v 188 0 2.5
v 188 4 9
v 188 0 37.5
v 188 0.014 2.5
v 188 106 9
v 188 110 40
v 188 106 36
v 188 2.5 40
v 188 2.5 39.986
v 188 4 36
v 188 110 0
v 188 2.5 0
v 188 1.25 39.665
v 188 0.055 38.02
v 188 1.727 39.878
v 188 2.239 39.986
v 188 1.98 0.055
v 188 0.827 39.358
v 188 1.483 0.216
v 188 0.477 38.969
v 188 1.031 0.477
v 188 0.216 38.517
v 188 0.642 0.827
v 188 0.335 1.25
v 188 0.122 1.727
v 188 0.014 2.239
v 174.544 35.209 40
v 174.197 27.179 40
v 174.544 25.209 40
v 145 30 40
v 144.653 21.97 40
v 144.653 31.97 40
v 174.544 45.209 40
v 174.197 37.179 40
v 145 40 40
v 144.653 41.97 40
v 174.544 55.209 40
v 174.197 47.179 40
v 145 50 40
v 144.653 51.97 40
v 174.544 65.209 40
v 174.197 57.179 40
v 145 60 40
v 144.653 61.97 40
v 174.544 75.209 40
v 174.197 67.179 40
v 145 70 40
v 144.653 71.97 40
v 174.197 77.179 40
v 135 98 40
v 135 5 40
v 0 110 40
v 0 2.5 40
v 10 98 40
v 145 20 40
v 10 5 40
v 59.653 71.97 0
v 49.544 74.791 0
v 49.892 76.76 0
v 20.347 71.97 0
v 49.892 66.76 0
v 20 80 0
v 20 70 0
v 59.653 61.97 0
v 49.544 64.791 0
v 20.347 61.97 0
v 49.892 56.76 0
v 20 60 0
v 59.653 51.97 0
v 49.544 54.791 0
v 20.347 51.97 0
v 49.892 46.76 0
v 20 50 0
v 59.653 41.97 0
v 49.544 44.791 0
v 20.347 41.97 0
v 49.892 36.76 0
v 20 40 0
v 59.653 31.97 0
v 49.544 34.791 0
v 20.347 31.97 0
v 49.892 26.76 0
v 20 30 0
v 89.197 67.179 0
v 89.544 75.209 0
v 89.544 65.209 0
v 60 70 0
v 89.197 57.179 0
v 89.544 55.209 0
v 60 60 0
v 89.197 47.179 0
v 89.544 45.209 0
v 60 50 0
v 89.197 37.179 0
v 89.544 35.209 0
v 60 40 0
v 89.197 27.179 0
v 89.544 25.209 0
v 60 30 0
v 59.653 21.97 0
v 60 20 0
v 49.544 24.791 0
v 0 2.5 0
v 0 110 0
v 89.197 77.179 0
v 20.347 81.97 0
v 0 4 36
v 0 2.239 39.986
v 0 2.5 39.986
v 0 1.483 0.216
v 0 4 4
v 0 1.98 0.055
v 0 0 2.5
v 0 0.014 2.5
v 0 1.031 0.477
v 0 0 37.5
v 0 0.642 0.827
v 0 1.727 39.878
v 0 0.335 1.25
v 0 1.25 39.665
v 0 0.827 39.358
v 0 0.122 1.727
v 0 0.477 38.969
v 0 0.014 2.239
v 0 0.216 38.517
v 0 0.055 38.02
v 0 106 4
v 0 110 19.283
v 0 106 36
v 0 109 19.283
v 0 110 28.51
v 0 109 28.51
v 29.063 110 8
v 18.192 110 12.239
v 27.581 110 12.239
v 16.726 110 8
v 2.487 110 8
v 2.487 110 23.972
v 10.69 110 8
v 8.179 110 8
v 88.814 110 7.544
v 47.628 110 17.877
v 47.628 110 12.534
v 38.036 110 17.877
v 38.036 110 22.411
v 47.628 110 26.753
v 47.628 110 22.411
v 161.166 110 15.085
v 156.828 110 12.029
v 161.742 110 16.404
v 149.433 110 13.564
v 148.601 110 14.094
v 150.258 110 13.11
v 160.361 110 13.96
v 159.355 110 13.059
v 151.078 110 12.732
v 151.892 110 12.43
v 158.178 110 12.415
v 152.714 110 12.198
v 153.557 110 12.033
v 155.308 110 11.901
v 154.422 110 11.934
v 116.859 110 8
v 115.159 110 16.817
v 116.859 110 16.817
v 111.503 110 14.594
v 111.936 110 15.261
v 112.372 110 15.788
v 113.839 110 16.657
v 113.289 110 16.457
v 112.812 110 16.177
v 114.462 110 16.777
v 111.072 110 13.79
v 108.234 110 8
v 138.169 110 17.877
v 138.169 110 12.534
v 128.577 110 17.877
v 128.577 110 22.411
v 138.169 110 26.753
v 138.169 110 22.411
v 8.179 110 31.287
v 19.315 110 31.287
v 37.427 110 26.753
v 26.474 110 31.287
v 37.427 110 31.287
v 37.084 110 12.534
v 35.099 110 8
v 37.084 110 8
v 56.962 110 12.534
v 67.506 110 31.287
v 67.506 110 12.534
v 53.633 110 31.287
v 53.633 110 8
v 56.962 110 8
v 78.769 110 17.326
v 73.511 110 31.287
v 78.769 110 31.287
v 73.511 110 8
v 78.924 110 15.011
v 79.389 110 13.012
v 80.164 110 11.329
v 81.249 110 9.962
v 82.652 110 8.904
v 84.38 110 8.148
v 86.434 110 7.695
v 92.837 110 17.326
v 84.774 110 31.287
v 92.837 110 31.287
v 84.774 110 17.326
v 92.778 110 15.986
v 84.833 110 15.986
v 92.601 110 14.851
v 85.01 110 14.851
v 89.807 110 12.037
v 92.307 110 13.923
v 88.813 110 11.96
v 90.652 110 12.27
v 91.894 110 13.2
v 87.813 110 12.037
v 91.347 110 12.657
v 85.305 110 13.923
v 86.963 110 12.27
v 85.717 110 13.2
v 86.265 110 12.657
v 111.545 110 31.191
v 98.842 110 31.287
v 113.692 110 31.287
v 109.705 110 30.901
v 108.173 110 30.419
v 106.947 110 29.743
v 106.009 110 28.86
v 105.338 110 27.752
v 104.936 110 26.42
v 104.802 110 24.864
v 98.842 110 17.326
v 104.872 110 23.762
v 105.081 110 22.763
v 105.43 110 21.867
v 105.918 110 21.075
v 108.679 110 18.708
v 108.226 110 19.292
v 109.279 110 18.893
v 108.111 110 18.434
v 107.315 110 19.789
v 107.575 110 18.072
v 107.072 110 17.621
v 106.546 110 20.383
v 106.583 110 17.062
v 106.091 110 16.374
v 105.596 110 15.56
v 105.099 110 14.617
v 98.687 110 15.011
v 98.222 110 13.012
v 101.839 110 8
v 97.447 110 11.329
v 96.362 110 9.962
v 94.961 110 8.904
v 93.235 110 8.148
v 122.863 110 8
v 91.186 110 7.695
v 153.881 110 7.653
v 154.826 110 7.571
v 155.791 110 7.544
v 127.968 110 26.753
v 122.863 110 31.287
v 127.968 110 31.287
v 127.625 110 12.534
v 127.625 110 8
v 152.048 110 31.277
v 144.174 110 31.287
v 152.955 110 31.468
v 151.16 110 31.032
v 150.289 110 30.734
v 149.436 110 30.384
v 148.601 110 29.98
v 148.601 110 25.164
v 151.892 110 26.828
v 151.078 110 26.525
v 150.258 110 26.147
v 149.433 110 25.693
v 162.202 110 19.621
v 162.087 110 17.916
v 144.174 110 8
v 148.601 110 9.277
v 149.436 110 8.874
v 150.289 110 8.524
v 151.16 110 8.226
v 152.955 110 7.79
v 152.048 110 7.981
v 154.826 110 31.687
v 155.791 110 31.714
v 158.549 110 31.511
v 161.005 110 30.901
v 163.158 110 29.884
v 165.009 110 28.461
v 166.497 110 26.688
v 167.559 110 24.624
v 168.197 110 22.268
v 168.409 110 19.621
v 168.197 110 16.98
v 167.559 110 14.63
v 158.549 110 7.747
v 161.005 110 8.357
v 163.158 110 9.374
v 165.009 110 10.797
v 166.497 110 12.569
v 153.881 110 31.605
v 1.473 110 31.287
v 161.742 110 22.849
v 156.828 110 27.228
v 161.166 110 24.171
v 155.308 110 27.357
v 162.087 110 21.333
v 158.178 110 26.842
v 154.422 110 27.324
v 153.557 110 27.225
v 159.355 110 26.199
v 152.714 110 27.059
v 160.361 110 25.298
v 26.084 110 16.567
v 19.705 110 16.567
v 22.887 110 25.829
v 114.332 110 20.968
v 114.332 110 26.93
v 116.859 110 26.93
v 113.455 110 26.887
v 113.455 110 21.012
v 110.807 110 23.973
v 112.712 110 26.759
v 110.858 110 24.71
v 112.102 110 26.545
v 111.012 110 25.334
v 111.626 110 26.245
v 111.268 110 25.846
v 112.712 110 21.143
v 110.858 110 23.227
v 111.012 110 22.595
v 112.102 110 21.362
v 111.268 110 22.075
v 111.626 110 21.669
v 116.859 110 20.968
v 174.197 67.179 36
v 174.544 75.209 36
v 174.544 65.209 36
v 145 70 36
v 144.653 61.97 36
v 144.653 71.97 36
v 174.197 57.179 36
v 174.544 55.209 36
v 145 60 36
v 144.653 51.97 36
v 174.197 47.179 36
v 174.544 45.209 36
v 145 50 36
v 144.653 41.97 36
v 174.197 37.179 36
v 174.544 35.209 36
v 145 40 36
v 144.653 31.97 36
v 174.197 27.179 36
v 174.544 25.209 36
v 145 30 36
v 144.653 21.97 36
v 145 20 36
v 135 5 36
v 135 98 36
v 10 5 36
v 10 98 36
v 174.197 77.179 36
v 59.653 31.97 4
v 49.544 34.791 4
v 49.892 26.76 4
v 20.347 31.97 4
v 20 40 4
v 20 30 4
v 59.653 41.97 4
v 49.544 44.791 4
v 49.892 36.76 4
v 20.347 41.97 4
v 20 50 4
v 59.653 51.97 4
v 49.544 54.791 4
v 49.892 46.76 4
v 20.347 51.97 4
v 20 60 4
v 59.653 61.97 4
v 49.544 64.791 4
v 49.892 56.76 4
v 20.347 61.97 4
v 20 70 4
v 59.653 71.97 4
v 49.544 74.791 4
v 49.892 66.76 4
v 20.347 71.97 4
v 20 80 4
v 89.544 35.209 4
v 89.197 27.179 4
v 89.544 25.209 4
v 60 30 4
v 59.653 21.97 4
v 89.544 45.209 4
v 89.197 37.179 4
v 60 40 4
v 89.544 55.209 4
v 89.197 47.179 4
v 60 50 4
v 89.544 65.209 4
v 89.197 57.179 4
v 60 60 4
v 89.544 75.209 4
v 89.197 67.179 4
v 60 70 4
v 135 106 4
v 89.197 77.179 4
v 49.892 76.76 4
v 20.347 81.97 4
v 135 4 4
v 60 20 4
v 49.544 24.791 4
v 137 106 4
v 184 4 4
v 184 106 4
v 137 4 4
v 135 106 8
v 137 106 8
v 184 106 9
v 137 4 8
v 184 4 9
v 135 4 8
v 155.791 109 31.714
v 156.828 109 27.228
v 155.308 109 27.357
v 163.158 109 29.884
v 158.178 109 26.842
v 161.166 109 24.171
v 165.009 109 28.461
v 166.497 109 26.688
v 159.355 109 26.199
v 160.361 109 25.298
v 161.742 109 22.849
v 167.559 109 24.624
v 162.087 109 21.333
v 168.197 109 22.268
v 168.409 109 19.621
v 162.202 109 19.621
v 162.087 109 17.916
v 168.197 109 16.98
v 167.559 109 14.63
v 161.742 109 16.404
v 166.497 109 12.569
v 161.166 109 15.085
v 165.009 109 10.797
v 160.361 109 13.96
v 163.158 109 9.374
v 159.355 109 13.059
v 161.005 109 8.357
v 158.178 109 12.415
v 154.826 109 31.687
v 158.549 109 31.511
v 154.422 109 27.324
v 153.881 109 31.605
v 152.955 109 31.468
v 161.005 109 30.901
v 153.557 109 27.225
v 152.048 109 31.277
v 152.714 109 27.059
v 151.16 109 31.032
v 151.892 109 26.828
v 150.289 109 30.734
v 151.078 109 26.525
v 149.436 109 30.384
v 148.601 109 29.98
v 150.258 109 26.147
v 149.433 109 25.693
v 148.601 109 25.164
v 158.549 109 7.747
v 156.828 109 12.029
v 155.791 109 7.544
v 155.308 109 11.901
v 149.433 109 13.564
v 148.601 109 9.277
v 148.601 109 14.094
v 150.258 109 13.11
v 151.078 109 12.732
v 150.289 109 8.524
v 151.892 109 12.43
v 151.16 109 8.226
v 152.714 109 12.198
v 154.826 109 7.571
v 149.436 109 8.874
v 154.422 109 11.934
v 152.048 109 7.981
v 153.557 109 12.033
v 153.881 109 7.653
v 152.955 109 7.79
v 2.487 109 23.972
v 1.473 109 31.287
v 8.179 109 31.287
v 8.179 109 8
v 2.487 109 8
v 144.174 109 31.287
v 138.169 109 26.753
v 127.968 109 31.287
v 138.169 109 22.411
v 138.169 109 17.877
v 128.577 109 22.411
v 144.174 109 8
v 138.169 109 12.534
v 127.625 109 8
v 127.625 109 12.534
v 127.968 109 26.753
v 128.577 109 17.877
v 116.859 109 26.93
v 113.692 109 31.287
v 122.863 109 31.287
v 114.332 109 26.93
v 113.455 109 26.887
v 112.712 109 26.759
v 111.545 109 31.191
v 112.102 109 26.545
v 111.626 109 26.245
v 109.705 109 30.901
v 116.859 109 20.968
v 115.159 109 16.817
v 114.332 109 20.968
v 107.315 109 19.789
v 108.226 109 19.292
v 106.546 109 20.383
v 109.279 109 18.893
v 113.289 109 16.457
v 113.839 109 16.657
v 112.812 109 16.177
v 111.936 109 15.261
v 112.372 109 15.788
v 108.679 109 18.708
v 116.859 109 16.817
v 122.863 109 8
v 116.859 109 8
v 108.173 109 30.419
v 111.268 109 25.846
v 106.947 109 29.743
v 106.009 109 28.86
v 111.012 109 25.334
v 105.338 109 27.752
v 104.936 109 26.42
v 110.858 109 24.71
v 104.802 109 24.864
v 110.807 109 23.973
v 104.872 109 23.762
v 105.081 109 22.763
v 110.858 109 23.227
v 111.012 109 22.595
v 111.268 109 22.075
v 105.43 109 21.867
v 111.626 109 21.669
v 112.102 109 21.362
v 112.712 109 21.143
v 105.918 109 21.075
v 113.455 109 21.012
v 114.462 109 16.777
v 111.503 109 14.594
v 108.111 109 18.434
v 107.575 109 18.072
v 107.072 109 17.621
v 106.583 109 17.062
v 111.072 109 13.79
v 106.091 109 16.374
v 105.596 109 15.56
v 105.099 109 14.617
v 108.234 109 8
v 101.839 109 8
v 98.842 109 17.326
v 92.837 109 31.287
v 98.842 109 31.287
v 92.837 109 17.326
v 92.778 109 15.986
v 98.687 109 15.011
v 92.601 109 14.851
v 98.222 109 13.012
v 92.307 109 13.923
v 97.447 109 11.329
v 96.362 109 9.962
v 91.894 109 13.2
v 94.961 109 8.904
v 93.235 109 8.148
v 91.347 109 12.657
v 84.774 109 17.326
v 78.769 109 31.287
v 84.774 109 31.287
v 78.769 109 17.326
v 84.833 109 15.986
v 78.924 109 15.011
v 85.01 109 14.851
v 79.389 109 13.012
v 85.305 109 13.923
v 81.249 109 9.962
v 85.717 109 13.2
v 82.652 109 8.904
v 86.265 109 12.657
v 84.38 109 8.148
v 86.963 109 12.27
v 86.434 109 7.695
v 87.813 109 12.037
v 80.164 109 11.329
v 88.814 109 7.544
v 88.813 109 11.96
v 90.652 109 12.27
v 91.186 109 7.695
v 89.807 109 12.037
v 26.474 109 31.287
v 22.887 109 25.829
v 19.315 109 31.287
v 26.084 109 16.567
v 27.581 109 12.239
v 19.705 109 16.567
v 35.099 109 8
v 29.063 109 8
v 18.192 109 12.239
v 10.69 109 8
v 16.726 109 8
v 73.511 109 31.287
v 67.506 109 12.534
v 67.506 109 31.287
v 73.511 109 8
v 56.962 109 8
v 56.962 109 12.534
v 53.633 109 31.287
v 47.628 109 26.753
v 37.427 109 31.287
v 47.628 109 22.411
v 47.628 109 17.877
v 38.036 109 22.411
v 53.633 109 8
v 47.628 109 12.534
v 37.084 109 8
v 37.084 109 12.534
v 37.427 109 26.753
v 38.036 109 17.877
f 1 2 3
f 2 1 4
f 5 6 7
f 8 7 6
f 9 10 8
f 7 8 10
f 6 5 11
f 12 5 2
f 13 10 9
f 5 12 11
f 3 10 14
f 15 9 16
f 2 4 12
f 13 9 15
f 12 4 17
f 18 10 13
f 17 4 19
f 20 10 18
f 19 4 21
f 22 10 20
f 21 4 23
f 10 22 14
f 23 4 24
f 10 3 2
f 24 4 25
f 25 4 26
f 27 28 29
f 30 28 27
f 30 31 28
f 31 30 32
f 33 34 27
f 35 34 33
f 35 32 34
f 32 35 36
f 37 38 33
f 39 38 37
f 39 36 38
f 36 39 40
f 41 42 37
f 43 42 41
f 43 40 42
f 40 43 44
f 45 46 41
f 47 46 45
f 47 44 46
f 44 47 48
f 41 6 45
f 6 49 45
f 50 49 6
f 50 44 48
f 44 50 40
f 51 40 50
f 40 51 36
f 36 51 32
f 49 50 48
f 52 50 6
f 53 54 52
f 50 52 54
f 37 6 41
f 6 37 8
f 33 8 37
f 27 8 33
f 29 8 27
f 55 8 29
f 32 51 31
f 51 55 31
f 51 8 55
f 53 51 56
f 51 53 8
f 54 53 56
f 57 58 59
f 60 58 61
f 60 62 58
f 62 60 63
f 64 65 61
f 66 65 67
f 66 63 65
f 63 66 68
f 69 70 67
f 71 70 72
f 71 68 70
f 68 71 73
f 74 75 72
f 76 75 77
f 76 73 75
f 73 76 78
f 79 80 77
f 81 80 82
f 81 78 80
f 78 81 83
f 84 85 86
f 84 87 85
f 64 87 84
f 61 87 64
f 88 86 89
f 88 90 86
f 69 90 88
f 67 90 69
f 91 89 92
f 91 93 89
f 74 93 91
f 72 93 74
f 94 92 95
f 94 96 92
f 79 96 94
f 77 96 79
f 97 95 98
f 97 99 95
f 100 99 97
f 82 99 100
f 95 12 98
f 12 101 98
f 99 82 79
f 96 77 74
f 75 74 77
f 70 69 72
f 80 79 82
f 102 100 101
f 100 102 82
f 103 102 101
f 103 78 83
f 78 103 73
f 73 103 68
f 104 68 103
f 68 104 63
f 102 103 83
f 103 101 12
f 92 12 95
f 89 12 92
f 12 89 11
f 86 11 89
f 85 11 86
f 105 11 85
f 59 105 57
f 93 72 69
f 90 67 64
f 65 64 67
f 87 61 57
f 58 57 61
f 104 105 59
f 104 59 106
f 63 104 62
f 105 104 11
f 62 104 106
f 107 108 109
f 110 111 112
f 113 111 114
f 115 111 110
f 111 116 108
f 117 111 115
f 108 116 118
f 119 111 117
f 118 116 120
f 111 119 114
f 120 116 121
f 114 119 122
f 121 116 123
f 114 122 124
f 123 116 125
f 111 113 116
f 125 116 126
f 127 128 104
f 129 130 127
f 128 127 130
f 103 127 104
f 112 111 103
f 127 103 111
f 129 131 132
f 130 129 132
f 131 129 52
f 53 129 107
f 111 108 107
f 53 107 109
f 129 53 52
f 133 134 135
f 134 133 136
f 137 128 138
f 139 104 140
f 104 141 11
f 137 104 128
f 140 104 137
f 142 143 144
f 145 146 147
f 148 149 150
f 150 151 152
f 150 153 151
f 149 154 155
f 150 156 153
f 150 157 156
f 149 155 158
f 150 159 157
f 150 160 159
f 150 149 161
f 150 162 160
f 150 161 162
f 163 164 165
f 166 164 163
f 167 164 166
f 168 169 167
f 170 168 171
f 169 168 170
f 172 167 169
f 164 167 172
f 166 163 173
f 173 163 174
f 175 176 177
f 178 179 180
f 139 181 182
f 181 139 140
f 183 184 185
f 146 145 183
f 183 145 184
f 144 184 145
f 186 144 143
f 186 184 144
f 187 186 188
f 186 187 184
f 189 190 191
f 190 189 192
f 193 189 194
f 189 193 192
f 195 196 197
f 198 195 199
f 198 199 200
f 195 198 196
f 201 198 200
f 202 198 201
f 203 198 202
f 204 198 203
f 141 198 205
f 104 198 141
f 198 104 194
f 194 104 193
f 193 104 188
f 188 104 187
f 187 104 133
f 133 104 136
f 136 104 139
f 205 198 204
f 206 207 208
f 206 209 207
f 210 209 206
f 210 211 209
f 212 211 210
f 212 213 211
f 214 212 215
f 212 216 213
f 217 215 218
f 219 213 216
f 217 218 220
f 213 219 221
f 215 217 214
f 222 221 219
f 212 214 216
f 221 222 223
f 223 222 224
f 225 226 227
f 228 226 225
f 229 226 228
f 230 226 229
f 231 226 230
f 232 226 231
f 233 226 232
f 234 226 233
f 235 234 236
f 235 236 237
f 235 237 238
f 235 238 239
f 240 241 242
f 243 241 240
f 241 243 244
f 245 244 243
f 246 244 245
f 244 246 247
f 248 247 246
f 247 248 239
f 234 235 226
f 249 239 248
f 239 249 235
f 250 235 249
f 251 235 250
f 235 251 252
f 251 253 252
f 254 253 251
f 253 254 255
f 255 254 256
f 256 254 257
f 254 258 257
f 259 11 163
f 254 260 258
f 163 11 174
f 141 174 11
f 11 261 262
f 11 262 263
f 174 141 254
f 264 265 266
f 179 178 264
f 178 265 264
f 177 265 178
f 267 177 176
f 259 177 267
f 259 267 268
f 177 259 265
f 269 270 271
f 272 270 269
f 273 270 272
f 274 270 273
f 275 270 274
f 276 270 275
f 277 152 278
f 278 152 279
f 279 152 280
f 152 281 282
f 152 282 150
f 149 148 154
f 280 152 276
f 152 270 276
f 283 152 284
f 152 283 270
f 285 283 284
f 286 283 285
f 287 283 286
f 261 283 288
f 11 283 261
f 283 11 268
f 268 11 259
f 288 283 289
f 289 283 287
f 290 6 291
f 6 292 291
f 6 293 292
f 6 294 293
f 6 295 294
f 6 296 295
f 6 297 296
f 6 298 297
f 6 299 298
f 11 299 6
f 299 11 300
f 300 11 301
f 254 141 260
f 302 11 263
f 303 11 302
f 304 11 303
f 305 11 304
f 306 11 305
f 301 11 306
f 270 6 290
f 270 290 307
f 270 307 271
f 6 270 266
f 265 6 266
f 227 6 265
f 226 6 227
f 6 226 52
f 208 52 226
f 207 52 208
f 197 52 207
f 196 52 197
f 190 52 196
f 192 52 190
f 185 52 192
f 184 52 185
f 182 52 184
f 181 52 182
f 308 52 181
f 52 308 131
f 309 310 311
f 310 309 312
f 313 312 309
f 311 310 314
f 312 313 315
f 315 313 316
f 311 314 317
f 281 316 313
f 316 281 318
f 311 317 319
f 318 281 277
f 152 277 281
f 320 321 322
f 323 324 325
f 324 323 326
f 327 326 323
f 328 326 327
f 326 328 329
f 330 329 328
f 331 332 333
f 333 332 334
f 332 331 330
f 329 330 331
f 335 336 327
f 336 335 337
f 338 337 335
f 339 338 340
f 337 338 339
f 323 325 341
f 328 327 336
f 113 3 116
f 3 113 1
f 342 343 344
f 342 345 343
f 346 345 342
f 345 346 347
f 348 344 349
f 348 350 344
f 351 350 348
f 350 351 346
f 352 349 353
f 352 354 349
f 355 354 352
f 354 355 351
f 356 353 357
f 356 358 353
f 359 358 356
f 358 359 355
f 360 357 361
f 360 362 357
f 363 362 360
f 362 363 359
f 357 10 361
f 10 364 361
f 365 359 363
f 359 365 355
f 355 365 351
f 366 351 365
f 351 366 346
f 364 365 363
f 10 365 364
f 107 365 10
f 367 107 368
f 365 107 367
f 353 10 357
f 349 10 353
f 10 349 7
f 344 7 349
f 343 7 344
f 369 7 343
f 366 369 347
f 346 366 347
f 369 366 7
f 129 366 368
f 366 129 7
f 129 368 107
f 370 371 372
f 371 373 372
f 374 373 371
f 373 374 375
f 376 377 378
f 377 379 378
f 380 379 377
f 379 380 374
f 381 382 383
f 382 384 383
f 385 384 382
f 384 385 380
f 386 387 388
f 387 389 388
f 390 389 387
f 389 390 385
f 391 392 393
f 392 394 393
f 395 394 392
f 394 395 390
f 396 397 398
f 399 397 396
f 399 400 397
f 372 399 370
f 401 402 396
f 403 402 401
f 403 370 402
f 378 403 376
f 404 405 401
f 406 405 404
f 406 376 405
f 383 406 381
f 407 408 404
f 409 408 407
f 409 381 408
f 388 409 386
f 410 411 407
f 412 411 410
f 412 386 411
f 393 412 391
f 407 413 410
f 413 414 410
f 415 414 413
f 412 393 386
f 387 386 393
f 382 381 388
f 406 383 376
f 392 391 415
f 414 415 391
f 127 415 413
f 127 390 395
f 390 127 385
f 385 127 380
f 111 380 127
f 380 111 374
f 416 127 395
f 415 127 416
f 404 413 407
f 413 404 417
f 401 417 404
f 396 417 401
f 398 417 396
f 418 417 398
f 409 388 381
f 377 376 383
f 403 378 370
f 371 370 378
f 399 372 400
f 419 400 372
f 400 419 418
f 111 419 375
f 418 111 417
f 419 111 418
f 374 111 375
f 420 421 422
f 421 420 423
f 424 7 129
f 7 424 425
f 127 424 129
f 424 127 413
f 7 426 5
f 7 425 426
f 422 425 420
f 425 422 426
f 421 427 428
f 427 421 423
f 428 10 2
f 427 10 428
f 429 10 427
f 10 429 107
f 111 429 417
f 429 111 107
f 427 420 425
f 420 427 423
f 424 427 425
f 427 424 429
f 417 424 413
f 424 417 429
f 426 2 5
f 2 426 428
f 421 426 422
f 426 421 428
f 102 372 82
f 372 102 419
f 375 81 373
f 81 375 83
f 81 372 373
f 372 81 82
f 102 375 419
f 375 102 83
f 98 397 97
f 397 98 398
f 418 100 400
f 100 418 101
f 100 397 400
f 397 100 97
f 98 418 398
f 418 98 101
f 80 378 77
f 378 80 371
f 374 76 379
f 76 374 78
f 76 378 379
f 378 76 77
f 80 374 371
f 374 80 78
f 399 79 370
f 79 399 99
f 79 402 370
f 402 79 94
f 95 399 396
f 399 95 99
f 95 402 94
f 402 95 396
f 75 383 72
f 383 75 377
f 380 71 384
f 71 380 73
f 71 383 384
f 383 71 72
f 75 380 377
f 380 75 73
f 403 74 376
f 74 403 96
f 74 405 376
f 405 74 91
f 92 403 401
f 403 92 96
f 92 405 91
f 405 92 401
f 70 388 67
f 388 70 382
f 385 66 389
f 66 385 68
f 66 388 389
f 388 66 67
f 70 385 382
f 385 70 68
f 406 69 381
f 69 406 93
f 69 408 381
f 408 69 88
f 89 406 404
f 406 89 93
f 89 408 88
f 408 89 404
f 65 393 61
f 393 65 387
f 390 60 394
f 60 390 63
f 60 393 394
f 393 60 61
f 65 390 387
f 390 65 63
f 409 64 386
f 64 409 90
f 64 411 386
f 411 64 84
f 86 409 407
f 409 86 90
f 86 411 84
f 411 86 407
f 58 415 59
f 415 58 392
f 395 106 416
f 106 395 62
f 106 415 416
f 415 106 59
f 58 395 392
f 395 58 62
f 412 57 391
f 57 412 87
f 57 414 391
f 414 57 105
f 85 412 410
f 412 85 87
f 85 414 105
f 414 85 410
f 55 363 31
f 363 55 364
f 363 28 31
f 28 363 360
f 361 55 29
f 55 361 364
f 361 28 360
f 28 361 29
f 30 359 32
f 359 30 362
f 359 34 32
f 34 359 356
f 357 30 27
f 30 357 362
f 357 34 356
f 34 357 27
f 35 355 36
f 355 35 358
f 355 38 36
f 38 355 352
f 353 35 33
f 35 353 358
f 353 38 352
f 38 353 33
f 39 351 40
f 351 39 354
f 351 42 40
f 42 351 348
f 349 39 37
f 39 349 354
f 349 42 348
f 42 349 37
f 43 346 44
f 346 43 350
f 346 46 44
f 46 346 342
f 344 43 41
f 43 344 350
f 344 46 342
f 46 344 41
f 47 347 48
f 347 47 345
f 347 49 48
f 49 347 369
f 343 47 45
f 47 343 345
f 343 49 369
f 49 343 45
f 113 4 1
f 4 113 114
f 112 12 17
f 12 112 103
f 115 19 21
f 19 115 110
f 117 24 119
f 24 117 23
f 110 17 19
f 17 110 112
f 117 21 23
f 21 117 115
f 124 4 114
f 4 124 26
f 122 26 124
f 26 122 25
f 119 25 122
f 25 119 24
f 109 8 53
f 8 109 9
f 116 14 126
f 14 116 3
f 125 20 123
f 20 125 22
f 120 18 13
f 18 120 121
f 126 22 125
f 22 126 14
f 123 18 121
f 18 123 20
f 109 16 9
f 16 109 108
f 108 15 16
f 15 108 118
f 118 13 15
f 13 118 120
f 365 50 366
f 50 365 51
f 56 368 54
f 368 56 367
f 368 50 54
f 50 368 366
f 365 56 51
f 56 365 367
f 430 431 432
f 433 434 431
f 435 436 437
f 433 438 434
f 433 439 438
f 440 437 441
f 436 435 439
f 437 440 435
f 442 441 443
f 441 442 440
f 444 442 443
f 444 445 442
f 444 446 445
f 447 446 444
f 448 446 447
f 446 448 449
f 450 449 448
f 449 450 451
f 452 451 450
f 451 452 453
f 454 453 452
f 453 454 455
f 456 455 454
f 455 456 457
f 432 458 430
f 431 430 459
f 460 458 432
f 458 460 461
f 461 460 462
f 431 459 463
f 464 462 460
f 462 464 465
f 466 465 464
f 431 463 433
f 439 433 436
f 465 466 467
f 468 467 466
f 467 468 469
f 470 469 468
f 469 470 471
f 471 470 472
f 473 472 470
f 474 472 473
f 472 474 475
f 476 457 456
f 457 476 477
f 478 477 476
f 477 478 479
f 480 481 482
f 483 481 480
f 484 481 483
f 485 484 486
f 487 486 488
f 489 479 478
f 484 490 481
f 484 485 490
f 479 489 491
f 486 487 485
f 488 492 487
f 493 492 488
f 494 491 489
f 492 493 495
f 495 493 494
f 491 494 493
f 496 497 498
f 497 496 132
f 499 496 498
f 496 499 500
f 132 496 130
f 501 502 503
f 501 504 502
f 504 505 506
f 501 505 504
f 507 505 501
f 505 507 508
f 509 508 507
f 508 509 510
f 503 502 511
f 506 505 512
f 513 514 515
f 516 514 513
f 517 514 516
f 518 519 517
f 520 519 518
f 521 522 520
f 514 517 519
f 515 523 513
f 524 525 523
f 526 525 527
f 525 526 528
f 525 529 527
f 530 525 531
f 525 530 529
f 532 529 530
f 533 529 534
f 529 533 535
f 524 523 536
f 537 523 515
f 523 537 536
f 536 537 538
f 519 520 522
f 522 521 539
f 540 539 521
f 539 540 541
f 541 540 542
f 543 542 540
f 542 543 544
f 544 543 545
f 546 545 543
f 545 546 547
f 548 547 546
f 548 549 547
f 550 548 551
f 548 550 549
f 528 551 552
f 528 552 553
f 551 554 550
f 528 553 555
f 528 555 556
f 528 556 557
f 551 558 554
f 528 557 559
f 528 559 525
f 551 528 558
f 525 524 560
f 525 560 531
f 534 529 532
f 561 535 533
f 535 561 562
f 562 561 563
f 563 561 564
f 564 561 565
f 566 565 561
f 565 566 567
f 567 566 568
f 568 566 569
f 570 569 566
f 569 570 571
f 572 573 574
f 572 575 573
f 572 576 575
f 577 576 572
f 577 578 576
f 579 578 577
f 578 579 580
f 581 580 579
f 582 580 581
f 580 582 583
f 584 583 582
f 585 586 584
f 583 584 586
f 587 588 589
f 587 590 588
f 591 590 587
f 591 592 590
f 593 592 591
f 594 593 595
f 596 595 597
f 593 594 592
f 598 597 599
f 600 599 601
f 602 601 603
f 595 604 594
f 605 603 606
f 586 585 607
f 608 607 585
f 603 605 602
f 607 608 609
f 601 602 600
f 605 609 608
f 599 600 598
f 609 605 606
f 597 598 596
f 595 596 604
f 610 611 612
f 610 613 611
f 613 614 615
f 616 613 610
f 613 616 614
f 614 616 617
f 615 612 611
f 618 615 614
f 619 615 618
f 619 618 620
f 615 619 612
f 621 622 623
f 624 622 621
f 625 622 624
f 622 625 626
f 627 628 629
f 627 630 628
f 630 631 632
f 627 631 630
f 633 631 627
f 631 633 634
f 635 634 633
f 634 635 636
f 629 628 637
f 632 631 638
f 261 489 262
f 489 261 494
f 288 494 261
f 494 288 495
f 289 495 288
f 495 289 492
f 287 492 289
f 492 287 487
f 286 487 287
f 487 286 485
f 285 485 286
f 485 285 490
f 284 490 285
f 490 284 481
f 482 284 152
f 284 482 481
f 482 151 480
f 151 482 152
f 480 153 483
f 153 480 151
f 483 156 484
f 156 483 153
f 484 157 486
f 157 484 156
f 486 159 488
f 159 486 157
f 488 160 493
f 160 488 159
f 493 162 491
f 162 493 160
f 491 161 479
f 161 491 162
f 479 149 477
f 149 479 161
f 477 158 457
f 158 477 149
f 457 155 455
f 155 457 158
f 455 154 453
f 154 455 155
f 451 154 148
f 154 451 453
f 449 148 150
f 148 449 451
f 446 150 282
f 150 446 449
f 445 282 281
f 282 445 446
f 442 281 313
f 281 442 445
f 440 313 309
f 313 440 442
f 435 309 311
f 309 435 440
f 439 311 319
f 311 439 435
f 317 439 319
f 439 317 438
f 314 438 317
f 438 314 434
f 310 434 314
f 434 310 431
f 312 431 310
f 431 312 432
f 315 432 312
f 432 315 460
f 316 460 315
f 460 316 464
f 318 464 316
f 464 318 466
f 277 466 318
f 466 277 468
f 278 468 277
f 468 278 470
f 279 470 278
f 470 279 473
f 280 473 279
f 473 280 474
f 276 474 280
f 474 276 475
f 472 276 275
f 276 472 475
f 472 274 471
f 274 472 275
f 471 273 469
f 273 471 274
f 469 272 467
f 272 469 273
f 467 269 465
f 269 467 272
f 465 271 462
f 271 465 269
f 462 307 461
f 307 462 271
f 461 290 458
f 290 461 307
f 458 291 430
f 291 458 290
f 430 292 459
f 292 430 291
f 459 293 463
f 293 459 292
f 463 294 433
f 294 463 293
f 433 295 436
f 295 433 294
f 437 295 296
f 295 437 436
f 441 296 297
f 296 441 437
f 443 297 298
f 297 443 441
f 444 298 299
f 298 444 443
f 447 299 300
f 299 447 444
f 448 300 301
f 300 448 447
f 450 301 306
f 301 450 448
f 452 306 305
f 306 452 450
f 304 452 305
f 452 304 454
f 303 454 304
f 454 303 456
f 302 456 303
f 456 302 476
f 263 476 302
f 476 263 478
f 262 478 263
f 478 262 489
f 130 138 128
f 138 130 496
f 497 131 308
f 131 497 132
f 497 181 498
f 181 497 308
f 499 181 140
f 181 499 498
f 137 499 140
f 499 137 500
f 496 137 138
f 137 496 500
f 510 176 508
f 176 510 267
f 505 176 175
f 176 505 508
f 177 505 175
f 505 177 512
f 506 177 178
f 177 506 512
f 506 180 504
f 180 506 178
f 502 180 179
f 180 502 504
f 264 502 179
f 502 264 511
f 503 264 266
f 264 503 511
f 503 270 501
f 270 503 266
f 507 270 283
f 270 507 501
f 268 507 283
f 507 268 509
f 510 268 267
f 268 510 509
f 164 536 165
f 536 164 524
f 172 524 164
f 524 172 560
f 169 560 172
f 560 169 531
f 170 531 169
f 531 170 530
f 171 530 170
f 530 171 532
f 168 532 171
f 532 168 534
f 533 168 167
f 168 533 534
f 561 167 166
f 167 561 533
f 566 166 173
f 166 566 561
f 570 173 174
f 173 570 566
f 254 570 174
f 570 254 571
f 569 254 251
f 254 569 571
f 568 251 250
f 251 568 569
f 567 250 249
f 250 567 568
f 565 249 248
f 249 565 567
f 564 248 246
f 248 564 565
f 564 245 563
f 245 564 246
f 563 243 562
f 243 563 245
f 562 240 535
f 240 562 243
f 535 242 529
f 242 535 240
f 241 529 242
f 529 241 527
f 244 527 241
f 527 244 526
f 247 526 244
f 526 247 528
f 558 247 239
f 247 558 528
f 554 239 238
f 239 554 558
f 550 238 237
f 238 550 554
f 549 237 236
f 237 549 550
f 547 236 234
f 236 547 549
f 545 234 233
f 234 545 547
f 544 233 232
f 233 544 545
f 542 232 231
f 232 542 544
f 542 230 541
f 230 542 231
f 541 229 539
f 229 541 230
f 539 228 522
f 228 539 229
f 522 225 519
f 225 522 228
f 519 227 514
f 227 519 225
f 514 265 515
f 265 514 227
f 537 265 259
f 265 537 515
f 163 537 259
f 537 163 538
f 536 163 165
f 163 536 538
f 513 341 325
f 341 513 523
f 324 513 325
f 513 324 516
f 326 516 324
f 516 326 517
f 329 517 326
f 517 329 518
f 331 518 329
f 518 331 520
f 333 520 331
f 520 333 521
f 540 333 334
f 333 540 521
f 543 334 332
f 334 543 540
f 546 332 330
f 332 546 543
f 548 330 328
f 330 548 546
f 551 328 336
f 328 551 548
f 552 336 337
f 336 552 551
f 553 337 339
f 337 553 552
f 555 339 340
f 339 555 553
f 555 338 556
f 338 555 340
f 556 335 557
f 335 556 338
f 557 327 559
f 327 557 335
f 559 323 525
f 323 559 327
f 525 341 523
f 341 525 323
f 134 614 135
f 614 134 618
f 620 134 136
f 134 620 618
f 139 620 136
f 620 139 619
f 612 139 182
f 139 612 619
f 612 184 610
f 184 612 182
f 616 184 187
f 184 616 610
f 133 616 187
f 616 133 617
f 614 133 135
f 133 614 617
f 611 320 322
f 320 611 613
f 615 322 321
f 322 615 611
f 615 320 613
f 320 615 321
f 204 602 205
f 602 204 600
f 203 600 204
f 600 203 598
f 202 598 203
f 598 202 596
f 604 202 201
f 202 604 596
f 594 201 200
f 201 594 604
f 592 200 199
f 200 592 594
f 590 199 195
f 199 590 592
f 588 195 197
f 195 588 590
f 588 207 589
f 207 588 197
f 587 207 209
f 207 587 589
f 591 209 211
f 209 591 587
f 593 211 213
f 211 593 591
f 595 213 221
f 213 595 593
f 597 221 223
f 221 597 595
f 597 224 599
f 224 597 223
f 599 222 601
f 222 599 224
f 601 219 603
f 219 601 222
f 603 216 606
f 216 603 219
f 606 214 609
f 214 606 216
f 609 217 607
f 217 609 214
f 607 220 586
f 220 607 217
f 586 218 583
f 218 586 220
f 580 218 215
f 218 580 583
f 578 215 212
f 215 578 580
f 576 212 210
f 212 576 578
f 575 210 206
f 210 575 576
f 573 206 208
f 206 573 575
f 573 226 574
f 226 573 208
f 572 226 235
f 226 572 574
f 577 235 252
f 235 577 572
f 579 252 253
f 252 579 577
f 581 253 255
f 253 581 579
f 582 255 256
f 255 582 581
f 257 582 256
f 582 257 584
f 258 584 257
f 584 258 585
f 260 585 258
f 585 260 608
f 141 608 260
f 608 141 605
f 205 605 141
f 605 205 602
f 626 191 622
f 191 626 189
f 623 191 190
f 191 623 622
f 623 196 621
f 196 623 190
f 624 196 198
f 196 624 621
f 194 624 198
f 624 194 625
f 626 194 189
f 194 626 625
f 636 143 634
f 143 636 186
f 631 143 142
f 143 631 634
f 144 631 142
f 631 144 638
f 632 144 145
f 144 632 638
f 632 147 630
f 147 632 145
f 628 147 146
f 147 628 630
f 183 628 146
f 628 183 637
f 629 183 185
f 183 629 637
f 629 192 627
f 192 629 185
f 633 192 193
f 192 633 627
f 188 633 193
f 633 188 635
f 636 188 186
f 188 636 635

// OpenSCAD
// First go. Lots of hardcoding. Way too much spacing.

$fs=0.1;

module pi_placeholder(){
    color([0,0.75,0]) cube([125, 93, 30]);
}

module battery_placeholder(){
    color([0.1,0.1,0.80]) cube([48, 90, 20]);
}

module hollow_box(x, y, z, thickness){
    difference(){
        cube([x, y, z]);
        translate([-thickness, thickness, thickness])
            cube([x+thickness, y-thickness*2, z-thickness*2]);
    }
}

difference(){
    union(){
        hollow_box(125+48+15, 110, 40, 4);
        translate([10,0,4]) translate([125,0,0])
            cube([2, 107, 4]);
        translate([10,0,4]) translate([174,0,0])
            cube([4, 107, 5]);
    }
    translate([10,5,15])
        pi_placeholder();
    translate([20,30,0])
        for (grill = [0:5])
            union(){            
            translate([0, 10*grill, 0])
                rotate(-10,0,0)
                cube([30,2,5]);
            translate([40, 10*grill - 10, 0])
                rotate( 10,0,0)
                cube([30,2,5]);
            }
    translate([145,20,35])
        for (grill = [0:5])
            translate([0, 10*grill, 0])
            rotate([0,0,10])
            cube([30,2,5]);

    cyledge(200, 5);
    
    translate([0,0,40])
        rotate([-90,0,0])
        cyledge(200, 5);
        
    
    translate([170, 109, 8])
        rotate([-90,-180,0])
        linear_extrude(6)
        text("CERULEAN",
             font="Source Code Pro:style=Bold",
             size=23);
}

//translate([5,5,5]) pi_placeholder();

module cyledge(length, diameter){
    difference(){
        cube([length*2,diameter,diameter], center=true);
        translate([0, diameter/2, diameter/2])
        rotate([0, 90, 0])
            cylinder(length, d1=diameter, d2=diameter);
    }
}

 
